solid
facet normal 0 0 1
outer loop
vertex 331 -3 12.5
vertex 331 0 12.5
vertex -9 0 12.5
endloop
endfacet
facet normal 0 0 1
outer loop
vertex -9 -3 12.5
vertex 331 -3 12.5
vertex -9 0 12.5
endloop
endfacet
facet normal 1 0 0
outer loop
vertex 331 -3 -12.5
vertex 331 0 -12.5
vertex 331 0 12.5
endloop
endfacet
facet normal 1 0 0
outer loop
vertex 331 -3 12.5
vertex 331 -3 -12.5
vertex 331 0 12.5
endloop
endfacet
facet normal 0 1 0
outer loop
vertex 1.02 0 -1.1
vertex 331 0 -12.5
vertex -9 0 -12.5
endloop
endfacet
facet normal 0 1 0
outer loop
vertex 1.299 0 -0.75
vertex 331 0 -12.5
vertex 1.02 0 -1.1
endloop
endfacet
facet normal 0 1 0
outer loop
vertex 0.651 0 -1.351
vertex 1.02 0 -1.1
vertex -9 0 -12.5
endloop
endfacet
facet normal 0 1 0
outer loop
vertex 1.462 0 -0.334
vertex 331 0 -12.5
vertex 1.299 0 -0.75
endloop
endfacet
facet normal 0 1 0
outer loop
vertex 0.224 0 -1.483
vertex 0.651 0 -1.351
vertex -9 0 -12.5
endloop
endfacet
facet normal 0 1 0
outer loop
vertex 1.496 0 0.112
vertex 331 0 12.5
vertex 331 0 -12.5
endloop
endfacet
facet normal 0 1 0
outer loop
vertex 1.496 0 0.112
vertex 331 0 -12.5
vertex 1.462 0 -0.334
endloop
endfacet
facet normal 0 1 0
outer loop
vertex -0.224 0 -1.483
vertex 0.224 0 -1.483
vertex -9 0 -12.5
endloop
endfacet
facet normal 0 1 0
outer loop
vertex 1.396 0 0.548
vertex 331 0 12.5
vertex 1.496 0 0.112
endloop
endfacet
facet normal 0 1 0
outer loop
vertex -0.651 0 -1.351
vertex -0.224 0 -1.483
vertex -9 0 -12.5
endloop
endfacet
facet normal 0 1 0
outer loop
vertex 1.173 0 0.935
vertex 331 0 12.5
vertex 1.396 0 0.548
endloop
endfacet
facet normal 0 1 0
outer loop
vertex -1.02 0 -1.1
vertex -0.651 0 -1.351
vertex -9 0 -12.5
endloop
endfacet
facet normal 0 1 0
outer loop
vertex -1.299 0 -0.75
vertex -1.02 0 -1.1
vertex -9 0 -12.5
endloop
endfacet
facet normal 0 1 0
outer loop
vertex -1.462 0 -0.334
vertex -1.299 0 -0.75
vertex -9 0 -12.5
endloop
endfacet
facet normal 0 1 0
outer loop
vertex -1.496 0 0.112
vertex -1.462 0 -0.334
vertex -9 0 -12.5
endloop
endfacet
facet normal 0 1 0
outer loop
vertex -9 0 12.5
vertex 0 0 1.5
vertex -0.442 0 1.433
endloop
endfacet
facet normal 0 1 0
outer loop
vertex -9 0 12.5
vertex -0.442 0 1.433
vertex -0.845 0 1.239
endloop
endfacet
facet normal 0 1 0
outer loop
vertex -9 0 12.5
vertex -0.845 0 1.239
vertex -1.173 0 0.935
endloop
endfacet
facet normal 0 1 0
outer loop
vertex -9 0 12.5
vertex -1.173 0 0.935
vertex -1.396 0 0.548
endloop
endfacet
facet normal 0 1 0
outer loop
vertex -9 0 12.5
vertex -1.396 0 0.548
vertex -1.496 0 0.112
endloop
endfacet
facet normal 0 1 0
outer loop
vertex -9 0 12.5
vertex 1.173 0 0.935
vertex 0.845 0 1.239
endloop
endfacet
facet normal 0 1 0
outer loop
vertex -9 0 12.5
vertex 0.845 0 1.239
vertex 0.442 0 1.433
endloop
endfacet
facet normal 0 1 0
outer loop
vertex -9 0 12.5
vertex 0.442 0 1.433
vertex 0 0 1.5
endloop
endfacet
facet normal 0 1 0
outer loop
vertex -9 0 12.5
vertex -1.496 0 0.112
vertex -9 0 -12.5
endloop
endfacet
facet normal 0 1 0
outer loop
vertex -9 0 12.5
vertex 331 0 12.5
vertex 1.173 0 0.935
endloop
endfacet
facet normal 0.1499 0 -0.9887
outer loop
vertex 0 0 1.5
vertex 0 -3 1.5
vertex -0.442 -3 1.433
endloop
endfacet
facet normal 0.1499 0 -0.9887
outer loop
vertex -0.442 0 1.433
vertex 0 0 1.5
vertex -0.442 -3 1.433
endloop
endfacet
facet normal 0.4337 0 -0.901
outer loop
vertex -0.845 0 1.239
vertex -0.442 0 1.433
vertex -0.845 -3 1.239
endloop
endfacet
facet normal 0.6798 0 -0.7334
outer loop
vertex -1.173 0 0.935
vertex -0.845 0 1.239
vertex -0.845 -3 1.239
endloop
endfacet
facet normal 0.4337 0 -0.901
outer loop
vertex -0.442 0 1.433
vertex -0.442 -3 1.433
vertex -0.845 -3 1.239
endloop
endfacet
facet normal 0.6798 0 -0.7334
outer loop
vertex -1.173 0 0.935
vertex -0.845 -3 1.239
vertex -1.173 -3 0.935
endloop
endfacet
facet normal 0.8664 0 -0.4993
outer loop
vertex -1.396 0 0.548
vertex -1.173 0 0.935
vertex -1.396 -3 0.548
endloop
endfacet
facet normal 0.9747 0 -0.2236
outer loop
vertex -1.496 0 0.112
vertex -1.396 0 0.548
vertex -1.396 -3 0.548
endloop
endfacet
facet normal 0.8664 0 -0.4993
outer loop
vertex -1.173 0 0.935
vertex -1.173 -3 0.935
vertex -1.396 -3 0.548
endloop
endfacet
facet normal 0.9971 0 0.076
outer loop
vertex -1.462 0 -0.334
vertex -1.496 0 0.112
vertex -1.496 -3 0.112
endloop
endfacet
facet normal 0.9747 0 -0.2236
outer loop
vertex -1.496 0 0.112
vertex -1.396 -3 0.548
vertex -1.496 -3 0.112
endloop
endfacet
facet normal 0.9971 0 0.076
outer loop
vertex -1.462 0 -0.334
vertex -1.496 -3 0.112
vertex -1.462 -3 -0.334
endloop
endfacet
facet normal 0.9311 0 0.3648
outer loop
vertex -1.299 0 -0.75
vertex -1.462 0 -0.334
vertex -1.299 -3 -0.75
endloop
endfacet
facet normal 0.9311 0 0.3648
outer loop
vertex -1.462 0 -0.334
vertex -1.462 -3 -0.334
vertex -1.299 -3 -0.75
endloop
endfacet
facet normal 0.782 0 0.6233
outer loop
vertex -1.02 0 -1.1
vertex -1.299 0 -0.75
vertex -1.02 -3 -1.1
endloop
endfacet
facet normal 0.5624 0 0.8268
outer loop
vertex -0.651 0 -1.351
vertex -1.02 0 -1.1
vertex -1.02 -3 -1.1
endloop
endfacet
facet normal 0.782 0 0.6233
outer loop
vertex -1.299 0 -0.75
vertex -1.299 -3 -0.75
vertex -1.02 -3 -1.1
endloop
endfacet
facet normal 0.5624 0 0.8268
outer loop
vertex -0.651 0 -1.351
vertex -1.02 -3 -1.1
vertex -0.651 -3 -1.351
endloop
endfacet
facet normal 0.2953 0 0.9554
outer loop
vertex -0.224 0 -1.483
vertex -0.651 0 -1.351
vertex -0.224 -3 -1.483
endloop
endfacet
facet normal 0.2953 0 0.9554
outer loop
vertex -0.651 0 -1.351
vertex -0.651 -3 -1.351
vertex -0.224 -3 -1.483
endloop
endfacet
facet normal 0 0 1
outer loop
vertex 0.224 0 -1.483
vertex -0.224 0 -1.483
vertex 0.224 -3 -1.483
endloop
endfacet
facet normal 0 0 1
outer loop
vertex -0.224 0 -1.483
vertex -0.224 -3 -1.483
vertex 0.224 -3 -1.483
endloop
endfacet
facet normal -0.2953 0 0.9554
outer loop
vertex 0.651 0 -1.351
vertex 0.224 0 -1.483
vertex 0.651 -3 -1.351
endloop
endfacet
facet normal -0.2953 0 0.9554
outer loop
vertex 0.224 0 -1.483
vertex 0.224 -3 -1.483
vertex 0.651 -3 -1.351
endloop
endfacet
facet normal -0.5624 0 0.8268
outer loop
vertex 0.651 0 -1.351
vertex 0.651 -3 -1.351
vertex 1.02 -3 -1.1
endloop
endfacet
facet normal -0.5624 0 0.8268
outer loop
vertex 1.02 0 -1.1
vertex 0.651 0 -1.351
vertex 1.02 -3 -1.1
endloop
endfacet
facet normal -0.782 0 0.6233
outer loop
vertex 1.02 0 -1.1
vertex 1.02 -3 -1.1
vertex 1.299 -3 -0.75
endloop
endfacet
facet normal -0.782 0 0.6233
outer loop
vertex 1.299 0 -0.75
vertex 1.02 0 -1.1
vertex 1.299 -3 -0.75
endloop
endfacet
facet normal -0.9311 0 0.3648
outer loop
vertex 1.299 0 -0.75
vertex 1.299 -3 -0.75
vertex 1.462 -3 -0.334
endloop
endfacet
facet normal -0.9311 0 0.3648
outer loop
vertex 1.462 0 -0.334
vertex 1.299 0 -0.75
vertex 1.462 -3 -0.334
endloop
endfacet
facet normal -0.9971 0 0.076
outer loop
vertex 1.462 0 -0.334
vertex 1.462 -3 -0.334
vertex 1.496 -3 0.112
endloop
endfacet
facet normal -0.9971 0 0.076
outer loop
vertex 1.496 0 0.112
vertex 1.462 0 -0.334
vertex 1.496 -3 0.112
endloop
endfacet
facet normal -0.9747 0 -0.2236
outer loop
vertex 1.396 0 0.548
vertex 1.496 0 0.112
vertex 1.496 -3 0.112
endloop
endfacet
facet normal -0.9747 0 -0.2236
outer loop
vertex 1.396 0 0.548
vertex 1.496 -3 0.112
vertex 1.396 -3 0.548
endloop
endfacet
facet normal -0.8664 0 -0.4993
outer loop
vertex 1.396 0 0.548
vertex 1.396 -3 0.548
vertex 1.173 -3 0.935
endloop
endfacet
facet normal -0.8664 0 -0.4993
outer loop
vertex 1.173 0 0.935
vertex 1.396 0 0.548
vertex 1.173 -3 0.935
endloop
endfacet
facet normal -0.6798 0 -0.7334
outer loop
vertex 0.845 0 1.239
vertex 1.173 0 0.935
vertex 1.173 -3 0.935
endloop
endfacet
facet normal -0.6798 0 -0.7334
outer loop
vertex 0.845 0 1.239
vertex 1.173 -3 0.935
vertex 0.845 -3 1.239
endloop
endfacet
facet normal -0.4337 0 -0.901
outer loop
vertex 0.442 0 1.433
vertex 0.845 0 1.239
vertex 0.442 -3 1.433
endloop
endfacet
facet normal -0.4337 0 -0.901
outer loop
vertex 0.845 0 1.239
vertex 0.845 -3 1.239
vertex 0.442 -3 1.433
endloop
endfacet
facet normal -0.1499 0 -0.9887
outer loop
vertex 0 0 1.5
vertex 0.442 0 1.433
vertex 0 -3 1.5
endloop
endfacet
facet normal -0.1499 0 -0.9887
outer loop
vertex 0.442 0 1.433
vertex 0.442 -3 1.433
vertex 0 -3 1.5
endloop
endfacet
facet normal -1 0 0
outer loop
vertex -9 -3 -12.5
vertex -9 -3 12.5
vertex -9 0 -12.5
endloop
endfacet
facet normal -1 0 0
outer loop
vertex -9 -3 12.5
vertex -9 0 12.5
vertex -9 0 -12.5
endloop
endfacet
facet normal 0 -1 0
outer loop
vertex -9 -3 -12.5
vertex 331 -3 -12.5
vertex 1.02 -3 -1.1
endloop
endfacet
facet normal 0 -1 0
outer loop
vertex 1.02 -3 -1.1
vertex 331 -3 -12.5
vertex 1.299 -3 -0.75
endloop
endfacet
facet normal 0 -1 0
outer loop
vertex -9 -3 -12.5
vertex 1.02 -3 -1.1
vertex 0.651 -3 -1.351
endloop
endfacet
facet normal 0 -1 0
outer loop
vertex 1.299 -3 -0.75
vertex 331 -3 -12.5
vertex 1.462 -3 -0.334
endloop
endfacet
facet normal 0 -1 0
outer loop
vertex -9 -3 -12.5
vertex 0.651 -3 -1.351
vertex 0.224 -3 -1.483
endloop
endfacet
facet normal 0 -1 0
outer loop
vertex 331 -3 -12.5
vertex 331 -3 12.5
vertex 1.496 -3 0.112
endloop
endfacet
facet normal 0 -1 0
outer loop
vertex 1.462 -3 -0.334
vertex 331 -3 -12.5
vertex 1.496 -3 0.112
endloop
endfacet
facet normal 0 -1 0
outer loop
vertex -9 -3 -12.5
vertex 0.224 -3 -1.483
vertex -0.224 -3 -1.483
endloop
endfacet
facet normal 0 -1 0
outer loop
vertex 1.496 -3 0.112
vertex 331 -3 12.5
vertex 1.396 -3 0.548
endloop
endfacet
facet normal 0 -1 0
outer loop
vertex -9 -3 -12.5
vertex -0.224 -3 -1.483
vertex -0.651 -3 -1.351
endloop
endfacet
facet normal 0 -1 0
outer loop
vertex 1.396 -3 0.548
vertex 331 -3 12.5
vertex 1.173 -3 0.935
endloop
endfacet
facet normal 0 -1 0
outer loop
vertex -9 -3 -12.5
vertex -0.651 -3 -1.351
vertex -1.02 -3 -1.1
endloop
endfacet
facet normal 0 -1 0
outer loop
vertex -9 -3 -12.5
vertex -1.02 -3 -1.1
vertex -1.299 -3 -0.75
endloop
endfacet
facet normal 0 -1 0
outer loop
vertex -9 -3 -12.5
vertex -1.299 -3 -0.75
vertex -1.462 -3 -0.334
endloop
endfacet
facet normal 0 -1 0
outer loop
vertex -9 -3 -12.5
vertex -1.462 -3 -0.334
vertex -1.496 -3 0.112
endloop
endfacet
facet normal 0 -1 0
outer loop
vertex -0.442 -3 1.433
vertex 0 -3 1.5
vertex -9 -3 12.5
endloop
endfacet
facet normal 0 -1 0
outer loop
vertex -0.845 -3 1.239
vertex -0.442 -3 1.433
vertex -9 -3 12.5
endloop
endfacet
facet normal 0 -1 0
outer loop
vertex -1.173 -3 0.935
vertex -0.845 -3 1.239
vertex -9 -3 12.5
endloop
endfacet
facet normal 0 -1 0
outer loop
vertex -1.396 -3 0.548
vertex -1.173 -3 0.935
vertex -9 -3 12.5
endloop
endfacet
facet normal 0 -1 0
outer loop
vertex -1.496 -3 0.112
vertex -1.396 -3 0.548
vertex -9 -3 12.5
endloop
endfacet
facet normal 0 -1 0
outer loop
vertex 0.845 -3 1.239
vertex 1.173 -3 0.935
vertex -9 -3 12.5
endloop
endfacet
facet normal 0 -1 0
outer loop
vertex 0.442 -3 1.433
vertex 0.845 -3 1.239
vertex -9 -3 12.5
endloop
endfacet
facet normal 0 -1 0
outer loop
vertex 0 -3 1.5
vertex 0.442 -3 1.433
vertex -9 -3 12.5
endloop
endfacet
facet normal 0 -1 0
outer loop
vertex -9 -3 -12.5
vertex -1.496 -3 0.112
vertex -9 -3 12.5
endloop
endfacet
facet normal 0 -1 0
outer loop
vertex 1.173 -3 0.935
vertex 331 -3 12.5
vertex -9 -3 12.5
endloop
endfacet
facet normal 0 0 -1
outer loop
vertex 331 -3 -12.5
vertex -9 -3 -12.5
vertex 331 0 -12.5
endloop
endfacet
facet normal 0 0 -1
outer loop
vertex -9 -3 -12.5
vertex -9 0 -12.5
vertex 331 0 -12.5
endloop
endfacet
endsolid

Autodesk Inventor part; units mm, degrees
ref_plane "YZ Plane" through (0, 0, 0) normal (1, 0, 0) x (0, 1, 0)
ref_plane "XZ Plane" through (0, 0, 0) normal (0, 1, 0) x (-1, 0, 0)
ref_plane "XY Plane" through (0, 0, 0) normal (0, 0, 1) x (1, 0, 0)
sketch "Sketch1" plane through (0, 0, 0) normal (0, 1, 0) x (-1, 0, 0)
  line L0 (-331, 12.5) -> (9, 12.5)
  line L1 (9, 12.5) -> (9, -12.5)
  line L2 (9, -12.5) -> (-331, -12.5)
  line L3 (-331, -12.5) -> (-331, 12.5)
  line L4 (-399, 0) -> (77, 0) construction
  point P0 (0, 0)
  point P1 (9, 0)
  dimension "d0" = 340
  dimension "d1" = 25
  dimension "d2" = 9
extrude "Extrusion1" add sketch "Sketch1" against normal blind 3
hole "Hole1" at (0, 0, 0) direction (0, -1, 0) diameter 3 end through all
properties part number "LIVER" material "Steel, Mild"
